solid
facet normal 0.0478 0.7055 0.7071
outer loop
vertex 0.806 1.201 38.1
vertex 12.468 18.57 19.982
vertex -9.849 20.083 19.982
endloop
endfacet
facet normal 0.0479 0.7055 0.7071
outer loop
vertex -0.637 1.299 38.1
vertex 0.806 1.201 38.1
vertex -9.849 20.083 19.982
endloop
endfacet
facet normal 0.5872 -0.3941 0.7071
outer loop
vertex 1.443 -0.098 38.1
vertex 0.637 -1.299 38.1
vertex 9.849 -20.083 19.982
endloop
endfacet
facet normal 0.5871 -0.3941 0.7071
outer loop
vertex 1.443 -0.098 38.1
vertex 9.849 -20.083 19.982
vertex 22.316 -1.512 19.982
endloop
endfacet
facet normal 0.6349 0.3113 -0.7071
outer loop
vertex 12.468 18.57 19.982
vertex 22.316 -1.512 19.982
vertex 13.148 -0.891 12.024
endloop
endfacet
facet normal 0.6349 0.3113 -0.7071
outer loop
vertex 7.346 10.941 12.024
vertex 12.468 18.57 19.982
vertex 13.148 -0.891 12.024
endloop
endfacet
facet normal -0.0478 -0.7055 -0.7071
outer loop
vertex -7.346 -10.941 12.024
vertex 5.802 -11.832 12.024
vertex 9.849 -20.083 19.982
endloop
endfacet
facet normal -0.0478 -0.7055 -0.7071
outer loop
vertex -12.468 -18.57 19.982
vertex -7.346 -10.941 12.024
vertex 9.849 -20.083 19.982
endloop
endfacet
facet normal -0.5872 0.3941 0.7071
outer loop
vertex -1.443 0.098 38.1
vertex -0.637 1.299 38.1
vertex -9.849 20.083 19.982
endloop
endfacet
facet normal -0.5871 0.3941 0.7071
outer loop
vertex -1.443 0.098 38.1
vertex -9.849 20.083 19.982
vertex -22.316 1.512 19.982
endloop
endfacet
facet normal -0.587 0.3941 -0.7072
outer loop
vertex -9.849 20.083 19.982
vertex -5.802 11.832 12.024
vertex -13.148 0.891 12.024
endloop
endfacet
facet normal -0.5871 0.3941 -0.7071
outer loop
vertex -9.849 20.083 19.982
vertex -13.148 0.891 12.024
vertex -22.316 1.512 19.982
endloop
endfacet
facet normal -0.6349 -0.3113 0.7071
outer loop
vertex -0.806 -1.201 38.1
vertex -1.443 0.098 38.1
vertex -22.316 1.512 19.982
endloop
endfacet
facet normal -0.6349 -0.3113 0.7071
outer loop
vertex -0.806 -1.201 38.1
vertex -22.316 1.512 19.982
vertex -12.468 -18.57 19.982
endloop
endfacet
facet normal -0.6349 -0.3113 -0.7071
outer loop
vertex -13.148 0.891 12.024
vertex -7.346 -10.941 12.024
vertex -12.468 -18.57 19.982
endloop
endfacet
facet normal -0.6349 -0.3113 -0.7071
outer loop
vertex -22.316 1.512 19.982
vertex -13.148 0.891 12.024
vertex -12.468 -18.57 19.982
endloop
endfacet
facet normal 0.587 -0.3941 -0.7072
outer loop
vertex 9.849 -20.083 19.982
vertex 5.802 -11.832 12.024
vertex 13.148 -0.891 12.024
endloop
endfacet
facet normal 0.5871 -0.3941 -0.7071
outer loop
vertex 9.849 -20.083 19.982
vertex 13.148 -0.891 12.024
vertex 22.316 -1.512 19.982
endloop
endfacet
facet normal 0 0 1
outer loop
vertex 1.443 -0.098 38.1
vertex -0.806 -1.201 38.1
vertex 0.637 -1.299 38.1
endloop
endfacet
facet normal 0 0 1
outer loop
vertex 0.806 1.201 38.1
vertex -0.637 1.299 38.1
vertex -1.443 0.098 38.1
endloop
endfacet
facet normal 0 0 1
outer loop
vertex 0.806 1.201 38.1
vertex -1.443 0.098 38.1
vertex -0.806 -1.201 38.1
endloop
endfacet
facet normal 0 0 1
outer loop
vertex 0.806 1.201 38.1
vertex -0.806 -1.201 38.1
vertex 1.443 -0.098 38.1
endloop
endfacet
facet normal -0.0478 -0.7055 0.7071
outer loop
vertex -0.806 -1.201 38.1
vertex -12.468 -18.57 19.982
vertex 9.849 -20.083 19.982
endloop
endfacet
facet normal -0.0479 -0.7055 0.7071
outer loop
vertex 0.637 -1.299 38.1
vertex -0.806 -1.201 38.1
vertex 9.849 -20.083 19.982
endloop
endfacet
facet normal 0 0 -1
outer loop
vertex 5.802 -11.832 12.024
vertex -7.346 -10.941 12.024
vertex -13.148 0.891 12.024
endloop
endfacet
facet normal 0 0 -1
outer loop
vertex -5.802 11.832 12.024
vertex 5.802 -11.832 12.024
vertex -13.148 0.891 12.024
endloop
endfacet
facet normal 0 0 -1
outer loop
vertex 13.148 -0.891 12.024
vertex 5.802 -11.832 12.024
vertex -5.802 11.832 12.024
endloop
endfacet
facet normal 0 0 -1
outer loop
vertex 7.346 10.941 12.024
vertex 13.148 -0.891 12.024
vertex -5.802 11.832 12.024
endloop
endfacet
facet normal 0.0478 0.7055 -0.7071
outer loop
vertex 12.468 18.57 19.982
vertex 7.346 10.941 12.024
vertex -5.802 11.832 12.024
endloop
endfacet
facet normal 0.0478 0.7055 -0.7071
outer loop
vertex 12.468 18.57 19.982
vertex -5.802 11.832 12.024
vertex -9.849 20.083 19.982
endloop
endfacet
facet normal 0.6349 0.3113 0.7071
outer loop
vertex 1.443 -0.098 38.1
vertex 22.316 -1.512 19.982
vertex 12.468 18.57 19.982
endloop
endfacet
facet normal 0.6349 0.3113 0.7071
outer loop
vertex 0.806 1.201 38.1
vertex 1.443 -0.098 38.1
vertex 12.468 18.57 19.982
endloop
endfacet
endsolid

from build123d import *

# Parameters (mm, degrees)
F1_DEPTH     = 38.1
F2_SIZE      = 22.86
F3_W         = 104.742500931
F3_H         = 73.319750838
F4_DEPTH     = 38.1
F5_T1_DEPTH  = 93.1636902777
F5_T3_DEPTH  = 93.1636902777
F5_T5_DEPTH  = 93.1636902777
F5_T7_DEPTH  = 93.1636902777
F5_T9_DEPTH  = 93.1636902777
F5_T11_DEPTH = 93.1636902777


# Not quite as in the source:
# - a fillet or chamfer that OpenCascade refuses, or shapes differently, is made with other operations: its cross-section is extruded or revolved along the edge and cut away or added


with BuildPart() as f1:
    # F0 (on Top) → F1 (new body, symmetric)
    with BuildSketch(Plane.XY):
        Polygon((15.5198623998, 23.1162996964), (-12.2593715787, 24.9987449497), (-27.7792339785, 1.8824452533), (-15.5198623998, -23.1162996964), (12.2593715787, -24.9987449497), (27.7792339785, -1.8824452533), align=None)
    extrude(amount=F1_DEPTH, both=True)

    # F2
    f2_edges = [f1.edges().sort_by_distance(p)[0] for p in [
        (21.649548, 10.616927, 38.1),
        (1.630245, 24.057522, 38.1),
        (-20.019303, 13.440595, 38.1),
        (-21.649548, -10.616927, 38.1),
        (-1.630245, -24.057522, 38.1),
        (20.019303, -13.440595, 38.1),
    ]]
    chamfer(f2_edges, length=F2_SIZE)

    # F3 (on Right) → F4 (cut, symmetric)
    with BuildSketch(Plane.YZ):
        with Locations((-5.571493879, -24.6362821199)):
            Rectangle(F3_W, F3_H)
    extrude(amount=F4_DEPTH, both=True, mode=Mode.SUBTRACT)

    # F5: chamfer of 12.7 on 6 edges, made by hand

    # F5_s2 → F5_t1 (cut)
    with BuildSketch(Plane(origin=(-20.5101939484, 41.8234412828, 0), x_dir=(0, 0, 1), z_dir=(0.4403044553, -0.8978485322, 0))):
        Polygon((24.7235932991, -24.1126954201), (12.0235932991, -11.4126954201), (12.0235932991, -24.1126954201), align=None)
    extrude(amount=F5_T1_DEPTH, mode=Mode.SUBTRACT)

    # F5_s4 → F5_t3 (cut)
    with BuildSketch(Plane(origin=(25.9650656504, 38.6740696373, 0), x_dir=(0, 0, 1), z_dir=(-0.55740741, -0.8302391097, 0))):
        Polygon((12.0235932991, -11.4126954201), (24.7235932991, -24.1126954201), (12.0235932991, -24.1126954201), align=None)
    extrude(amount=F5_T3_DEPTH, mode=Mode.SUBTRACT)

    # F5_s6 → F5_t5 (cut)
    with BuildSketch(Plane(origin=(46.4752595988, -3.1493716455, 0), x_dir=(0, 0, 1), z_dir=(-0.9977118652, 0.0676094224, 0))):
        Polygon((12.0235932991, -11.4126954201), (24.7235932991, -24.1126954201), (12.0235932991, -24.1126954201), align=None)
    extrude(amount=F5_T5_DEPTH, mode=Mode.SUBTRACT)

    # F5_s8 → F5_t7 (cut)
    with BuildSketch(Plane(origin=(20.5101939484, -41.8234412828, 0), x_dir=(0, 0, 1), z_dir=(-0.4403044553, 0.8978485322, 0))):
        Polygon((12.0235932991, -11.4126954201), (24.7235932991, -24.1126954201), (12.0235932991, -24.1126954201), align=None)
    extrude(amount=F5_T7_DEPTH, mode=Mode.SUBTRACT)

    # F5_s10 → F5_t9 (cut)
    with BuildSketch(Plane(origin=(-25.9650656504, -38.6740696373, 0), x_dir=(0, 0, 1), z_dir=(0.55740741, 0.8302391097, 0))):
        Polygon((12.0235932991, -11.4126954201), (24.7235932991, -24.1126954201), (12.0235932991, -24.1126954201), align=None)
    extrude(amount=F5_T9_DEPTH, mode=Mode.SUBTRACT)

    # F5_s12 → F5_t11 (cut)
    with BuildSketch(Plane(origin=(-46.4752595988, 3.1493716455, 0), x_dir=(0, 0, 1), z_dir=(0.9977118652, -0.0676094224, 0))):
        Polygon((12.0235932991, -11.4126954201), (24.7235932991, -24.1126954201), (12.0235932991, -24.1126954201), align=None)
    extrude(amount=F5_T11_DEPTH, mode=Mode.SUBTRACT)


solid = f1.part
